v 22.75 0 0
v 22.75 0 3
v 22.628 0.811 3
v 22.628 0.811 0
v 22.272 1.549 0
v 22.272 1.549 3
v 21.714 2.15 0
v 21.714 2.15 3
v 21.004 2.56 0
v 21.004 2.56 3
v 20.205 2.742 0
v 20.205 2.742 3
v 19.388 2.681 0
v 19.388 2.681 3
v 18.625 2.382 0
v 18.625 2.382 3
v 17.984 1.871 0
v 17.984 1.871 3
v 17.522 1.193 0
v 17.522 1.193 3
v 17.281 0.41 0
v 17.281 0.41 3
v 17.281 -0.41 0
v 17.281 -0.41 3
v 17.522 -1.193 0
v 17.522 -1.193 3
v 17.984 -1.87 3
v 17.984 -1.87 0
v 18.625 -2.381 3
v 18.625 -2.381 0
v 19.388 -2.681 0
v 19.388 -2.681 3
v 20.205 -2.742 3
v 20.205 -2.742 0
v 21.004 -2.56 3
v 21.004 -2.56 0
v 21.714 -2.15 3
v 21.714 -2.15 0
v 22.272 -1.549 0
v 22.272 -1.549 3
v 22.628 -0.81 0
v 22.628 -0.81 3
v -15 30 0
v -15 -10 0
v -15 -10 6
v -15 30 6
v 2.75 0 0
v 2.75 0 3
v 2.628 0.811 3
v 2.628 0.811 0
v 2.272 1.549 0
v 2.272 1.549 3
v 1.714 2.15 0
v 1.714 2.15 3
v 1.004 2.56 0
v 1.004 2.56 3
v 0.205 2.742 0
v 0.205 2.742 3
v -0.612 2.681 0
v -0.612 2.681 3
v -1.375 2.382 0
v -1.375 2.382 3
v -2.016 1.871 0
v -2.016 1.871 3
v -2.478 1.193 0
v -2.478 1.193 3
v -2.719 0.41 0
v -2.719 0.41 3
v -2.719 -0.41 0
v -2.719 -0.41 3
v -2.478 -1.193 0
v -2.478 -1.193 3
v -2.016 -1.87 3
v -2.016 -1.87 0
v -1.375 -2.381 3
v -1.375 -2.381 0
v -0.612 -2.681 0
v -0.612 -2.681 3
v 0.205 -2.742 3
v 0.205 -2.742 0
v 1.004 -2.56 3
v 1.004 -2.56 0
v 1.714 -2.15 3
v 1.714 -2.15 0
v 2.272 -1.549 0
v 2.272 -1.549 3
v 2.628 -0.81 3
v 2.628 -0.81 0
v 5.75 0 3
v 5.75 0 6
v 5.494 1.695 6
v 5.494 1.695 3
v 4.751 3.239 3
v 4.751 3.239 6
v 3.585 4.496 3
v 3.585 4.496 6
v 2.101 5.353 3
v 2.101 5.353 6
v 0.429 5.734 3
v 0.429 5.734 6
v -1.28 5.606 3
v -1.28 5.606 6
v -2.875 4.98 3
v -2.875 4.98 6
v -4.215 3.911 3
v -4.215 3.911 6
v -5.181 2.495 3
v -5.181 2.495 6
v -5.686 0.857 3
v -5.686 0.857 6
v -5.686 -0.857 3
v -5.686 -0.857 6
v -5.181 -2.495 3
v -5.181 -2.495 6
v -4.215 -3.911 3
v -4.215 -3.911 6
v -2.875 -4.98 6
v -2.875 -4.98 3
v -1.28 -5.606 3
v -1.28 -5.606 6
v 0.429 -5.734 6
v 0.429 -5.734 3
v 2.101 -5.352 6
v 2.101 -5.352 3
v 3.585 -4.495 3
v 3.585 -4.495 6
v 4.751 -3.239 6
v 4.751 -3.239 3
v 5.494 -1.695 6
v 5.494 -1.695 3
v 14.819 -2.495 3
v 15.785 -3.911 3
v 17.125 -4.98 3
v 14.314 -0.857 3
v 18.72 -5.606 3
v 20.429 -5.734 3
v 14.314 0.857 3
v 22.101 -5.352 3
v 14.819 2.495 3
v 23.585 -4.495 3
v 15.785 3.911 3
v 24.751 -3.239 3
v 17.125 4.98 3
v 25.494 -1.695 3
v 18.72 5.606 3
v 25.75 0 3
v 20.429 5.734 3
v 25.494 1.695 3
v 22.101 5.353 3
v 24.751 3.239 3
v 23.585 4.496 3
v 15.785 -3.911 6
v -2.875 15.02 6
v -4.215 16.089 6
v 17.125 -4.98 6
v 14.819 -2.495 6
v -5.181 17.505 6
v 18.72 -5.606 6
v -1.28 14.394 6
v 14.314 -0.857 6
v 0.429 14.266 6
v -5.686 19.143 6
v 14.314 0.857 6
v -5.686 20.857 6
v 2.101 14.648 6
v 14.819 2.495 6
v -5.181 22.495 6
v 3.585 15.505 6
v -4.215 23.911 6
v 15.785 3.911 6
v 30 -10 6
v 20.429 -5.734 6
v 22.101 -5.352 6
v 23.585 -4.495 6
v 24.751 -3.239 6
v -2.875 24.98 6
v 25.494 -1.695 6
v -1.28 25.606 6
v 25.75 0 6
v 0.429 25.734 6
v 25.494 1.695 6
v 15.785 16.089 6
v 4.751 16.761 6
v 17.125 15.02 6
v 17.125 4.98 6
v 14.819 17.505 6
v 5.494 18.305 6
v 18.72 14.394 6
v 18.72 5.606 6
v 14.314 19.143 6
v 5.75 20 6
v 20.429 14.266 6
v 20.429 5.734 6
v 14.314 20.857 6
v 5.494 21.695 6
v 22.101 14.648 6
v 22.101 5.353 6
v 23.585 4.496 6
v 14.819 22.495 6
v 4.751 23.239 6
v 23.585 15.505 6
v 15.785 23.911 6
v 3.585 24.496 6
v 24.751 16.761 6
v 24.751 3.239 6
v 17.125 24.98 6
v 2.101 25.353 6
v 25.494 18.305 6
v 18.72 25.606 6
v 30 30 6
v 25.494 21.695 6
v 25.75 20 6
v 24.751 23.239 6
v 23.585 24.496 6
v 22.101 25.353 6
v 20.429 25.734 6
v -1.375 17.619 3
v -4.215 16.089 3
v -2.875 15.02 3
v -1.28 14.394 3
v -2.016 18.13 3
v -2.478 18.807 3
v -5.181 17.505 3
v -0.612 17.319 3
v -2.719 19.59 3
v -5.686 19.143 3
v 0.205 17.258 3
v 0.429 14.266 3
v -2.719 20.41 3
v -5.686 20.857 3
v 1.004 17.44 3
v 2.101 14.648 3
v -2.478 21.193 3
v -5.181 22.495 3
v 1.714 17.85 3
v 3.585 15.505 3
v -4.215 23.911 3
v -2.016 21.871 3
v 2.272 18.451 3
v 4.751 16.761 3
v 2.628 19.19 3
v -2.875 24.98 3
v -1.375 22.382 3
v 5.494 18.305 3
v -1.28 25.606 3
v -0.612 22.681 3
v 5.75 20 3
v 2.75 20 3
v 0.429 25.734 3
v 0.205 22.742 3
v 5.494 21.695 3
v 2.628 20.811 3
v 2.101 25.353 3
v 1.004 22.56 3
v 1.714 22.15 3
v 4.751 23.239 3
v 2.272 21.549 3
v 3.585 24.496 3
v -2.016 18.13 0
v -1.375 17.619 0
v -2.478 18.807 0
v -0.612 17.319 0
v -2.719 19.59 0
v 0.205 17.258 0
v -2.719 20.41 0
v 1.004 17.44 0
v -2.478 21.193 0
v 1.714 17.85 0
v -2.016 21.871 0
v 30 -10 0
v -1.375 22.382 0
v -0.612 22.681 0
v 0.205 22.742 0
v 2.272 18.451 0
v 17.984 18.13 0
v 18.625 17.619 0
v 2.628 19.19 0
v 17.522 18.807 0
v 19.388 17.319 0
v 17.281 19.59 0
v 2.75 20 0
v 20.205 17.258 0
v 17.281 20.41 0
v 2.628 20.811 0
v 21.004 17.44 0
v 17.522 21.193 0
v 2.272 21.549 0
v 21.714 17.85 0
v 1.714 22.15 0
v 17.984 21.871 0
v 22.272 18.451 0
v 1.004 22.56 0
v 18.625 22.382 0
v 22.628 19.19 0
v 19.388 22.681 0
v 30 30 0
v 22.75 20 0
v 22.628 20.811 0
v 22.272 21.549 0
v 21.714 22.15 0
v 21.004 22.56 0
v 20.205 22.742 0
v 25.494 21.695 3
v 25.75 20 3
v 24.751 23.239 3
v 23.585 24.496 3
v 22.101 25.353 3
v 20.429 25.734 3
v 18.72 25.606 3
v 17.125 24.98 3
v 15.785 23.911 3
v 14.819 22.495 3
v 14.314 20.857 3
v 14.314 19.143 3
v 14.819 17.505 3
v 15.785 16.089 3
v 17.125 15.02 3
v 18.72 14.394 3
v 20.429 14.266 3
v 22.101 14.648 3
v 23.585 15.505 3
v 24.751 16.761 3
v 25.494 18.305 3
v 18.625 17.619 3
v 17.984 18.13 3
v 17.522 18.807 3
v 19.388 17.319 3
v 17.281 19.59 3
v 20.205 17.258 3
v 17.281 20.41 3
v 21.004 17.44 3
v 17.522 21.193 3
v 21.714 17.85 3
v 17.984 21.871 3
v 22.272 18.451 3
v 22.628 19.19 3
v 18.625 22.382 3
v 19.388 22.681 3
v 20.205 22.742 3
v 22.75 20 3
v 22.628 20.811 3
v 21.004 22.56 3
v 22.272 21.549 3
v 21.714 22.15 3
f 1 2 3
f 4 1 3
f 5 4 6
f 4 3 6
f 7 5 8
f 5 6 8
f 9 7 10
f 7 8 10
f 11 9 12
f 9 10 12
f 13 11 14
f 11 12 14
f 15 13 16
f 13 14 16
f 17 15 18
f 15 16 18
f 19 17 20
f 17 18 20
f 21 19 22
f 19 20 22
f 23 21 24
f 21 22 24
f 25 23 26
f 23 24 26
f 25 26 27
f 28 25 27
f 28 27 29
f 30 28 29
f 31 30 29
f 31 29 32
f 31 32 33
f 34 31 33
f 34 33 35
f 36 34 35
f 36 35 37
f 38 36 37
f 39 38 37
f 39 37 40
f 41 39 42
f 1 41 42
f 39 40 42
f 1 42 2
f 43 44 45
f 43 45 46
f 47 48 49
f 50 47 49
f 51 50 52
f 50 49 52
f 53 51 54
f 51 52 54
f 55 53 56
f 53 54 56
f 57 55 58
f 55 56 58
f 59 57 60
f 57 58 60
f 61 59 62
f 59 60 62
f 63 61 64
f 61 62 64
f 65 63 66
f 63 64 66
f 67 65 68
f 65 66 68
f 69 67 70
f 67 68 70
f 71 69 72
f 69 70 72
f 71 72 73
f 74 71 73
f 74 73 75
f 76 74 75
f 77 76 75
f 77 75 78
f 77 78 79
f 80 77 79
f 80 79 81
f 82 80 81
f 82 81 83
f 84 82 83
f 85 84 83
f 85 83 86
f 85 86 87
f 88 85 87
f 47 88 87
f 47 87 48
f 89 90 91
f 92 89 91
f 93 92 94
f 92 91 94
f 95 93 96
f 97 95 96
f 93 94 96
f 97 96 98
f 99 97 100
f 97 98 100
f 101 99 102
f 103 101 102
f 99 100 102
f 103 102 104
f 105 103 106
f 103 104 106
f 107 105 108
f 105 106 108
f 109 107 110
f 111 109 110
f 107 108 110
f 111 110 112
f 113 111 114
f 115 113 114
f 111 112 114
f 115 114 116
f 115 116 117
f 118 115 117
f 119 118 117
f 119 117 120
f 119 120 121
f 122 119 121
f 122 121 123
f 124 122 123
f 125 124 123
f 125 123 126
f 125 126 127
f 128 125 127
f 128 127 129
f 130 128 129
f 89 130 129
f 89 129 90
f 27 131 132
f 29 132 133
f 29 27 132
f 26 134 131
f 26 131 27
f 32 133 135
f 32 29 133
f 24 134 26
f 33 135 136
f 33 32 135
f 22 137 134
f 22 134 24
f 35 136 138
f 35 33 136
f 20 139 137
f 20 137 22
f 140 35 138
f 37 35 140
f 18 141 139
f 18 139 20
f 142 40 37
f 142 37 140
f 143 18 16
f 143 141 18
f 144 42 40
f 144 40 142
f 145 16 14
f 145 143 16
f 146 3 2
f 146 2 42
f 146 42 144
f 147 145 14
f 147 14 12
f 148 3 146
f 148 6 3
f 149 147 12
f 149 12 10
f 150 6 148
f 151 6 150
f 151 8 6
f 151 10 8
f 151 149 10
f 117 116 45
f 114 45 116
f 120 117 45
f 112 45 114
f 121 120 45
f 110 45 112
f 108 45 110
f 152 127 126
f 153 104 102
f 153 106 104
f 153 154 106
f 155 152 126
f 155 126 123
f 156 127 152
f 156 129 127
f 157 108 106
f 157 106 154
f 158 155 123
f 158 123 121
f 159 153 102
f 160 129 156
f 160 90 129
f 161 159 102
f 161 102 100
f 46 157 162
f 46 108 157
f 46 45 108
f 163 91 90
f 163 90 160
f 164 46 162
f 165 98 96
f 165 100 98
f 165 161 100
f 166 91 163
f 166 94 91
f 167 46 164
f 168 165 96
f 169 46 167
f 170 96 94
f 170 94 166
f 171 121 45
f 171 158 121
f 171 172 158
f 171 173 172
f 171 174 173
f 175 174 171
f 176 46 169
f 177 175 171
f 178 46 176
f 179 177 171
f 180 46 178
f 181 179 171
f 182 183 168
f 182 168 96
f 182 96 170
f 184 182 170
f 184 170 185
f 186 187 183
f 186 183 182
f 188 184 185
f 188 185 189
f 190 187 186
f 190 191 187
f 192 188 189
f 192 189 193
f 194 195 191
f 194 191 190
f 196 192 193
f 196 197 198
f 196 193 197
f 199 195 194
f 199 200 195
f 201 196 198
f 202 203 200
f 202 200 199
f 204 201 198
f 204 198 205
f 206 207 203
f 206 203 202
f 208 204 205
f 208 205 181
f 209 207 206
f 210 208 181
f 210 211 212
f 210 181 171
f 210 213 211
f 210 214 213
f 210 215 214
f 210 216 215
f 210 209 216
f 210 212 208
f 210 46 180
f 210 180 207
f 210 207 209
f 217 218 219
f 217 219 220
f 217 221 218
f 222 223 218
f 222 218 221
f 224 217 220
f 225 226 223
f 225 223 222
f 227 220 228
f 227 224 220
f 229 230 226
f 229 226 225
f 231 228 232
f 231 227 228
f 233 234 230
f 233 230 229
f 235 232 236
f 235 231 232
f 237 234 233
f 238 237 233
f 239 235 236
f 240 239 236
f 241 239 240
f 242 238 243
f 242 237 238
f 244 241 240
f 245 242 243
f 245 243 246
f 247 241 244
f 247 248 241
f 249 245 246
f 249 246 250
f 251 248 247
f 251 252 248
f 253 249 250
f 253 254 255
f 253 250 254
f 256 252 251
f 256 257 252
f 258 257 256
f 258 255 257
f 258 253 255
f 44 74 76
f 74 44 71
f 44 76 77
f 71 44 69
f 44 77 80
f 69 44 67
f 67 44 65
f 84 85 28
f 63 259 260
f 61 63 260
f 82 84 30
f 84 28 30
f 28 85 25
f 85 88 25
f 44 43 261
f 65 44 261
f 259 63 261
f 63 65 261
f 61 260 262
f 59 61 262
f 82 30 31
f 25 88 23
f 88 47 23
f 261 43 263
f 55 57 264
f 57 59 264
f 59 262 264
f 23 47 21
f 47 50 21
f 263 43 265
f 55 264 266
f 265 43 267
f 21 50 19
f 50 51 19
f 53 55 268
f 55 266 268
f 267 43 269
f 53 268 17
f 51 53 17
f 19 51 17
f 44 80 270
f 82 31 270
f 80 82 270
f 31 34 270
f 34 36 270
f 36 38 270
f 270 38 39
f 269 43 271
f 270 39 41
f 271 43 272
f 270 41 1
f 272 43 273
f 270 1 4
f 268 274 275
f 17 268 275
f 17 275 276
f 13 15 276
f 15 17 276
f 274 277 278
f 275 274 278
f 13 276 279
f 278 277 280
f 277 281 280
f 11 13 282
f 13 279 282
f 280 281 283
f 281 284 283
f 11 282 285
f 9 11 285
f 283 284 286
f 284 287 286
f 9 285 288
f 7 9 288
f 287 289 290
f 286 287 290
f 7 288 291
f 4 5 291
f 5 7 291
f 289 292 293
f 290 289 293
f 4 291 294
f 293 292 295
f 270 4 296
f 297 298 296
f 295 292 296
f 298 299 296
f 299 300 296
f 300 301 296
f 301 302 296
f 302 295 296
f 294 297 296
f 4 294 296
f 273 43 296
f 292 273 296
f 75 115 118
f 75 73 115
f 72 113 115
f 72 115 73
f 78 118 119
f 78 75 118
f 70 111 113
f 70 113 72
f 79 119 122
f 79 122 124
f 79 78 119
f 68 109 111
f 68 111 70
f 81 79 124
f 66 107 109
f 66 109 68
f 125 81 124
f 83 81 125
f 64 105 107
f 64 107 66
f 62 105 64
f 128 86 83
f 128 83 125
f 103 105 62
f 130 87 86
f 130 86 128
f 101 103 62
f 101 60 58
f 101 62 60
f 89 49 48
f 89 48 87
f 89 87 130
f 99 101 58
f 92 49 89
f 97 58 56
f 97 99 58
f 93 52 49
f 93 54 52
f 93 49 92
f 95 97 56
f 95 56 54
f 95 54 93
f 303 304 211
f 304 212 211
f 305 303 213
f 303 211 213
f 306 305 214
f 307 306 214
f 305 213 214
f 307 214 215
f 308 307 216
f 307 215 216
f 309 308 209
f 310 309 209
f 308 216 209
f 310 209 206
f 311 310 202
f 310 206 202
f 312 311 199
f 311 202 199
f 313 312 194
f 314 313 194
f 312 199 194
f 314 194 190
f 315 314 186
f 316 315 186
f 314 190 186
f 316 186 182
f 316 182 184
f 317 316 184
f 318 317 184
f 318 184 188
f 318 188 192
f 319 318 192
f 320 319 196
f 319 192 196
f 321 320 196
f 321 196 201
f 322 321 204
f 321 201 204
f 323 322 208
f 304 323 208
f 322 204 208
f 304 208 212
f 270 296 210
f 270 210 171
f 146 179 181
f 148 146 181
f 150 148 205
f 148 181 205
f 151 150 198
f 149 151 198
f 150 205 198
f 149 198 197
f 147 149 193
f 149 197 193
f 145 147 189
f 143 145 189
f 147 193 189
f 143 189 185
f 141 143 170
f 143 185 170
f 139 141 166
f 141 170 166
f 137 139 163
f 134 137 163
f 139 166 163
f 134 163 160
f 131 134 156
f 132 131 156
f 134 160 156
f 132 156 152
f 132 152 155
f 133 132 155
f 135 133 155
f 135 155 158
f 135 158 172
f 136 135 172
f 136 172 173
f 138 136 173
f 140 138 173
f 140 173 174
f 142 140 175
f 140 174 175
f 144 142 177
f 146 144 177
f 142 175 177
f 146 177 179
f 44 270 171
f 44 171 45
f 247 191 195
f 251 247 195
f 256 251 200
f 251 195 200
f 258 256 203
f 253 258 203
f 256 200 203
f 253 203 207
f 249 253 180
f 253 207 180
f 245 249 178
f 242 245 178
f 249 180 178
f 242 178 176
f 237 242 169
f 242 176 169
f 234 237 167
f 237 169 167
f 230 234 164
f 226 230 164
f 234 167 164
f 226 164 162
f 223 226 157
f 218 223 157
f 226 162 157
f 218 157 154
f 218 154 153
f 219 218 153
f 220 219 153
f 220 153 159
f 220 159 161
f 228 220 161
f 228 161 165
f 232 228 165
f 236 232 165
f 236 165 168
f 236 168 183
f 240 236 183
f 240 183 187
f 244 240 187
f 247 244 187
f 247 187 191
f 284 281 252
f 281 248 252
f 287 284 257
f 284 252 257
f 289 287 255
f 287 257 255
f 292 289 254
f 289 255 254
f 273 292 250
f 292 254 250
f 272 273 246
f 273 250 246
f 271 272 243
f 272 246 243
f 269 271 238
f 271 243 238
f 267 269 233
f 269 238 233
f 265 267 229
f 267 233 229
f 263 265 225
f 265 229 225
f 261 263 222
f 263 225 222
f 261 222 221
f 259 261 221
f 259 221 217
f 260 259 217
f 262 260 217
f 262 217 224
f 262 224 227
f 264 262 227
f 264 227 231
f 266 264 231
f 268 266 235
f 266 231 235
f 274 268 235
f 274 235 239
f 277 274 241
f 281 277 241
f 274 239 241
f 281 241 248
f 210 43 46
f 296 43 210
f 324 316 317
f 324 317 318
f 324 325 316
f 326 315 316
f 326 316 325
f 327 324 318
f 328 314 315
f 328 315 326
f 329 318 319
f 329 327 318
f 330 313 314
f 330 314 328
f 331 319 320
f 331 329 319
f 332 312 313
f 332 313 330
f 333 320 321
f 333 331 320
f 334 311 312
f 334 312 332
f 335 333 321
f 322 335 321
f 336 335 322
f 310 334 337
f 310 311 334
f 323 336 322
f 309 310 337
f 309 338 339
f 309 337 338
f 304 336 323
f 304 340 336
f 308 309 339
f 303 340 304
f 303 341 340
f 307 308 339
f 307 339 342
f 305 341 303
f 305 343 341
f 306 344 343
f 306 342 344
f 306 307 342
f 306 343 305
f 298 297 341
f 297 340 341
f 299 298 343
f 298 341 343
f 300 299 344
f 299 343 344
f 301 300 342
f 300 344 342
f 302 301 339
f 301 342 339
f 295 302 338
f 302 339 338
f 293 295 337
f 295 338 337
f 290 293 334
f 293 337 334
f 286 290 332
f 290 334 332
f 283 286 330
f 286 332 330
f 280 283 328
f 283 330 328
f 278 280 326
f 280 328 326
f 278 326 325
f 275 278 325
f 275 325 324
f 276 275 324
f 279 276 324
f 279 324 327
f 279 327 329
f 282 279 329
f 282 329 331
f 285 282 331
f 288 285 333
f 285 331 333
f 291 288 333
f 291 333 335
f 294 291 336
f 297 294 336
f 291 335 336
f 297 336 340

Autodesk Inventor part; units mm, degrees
ref_plane "YZ Plane" through (0, 0, 0) normal (1, 0, 0) x (0, 1, 0)
ref_plane "XZ Plane" through (0, 0, 0) normal (0, 1, 0) x (-1, 0, 0)
ref_plane "XY Plane" through (0, 0, 0) normal (0, 0, 1) x (1, 0, 0)
sketch "Boceto1" plane through (0, 0, 0) normal (0, 0, 1) x (1, 0, 0)
  line L0 (29.9998, -9.9999) -> (-15.0002, -9.9999)
  line L1 (-15.0002, -9.9999) -> (-15.0002, 30.0001)
  line L2 (-15.0002, 30.0001) -> (29.9998, 30.0001)
  line L3 (29.9998, 30.0001) -> (29.9998, -9.9999)
  line L4 (-9.8002, -9.9999) -> (-4.883, -9.9999) projected
  line L5 (29.9998, 24.8001) -> (29.9998, 30.0001) projected
  line L6 (-4.8002, 30.0001) -> (-10.0002, 30.0001) projected
  point P0 (0, 0)
  dimension "d0" = 45
extrude "Extrusión1" add sketch "Boceto1" along normal blind 6
sketch "Boceto8" plane through (0, 0, 6) normal (0, 0, 1) x (1, 0, 0)
  circle A0 centre (19.9998, 0.0001) radius 2.5 projected
  circle A1 centre (19.9998, 20.0001) radius 2.5 projected
  circle A2 centre (-0.0002, 0.0001) radius 2.5 projected
  circle A3 centre (-0.0002, 20.0001) radius 2.5 projected
  circle A4 centre (19.9998, 20.0001) radius 2.75
  circle A5 centre (-0.0002, 20.0001) radius 2.75
  circle A6 centre (-0.0002, 0.0001) radius 2.75
  circle A7 centre (19.9998, 0.0001) radius 2.75
  point P0 (0, 0)
  dimension "d28" = 5.5
  dimension "d29" = 5.5
  dimension "d30" = 5.5
  dimension "d31" = 5.5
extrude "Extrusión8" cut sketch "Boceto8" against normal through all contours A0 | A1 | A2 | A3 | A4 | A5 | A6 | A7
sketch "Boceto9" plane through (0, 0, 6) normal (0, 0, 1) x (1, 0, 0)
  circle A0 centre (19.9998, 0.0001) radius 2.75 projected
  circle A1 centre (-0.0002, 0.0001) radius 2.75 projected
  circle A2 centre (-0.0002, 20.0001) radius 2.75 projected
  circle A3 centre (19.9998, 20.0001) radius 2.75 projected
  circle A4 centre (19.9998, 0.0001) radius 5.75
  circle A5 centre (-0.0002, 0.0001) radius 2.75 projected
  circle A6 centre (-0.0002, 0.0001) radius 5.75
  circle A7 centre (19.9998, 20.0001) radius 2.75 projected
  circle A8 centre (19.9998, 20.0001) radius 5.75
  circle A9 centre (-0.0002, 20.0001) radius 5.75
  point P0 (0, 0)
  dimension "d34" = 11.5
  dimension "d35" = 11.5
  dimension "d36" = 11.5
  dimension "d37" = 11.5
extrude "Extrusión9" cut sketch "Boceto9" against normal blind 3
properties part number "MONTURA LCD"
